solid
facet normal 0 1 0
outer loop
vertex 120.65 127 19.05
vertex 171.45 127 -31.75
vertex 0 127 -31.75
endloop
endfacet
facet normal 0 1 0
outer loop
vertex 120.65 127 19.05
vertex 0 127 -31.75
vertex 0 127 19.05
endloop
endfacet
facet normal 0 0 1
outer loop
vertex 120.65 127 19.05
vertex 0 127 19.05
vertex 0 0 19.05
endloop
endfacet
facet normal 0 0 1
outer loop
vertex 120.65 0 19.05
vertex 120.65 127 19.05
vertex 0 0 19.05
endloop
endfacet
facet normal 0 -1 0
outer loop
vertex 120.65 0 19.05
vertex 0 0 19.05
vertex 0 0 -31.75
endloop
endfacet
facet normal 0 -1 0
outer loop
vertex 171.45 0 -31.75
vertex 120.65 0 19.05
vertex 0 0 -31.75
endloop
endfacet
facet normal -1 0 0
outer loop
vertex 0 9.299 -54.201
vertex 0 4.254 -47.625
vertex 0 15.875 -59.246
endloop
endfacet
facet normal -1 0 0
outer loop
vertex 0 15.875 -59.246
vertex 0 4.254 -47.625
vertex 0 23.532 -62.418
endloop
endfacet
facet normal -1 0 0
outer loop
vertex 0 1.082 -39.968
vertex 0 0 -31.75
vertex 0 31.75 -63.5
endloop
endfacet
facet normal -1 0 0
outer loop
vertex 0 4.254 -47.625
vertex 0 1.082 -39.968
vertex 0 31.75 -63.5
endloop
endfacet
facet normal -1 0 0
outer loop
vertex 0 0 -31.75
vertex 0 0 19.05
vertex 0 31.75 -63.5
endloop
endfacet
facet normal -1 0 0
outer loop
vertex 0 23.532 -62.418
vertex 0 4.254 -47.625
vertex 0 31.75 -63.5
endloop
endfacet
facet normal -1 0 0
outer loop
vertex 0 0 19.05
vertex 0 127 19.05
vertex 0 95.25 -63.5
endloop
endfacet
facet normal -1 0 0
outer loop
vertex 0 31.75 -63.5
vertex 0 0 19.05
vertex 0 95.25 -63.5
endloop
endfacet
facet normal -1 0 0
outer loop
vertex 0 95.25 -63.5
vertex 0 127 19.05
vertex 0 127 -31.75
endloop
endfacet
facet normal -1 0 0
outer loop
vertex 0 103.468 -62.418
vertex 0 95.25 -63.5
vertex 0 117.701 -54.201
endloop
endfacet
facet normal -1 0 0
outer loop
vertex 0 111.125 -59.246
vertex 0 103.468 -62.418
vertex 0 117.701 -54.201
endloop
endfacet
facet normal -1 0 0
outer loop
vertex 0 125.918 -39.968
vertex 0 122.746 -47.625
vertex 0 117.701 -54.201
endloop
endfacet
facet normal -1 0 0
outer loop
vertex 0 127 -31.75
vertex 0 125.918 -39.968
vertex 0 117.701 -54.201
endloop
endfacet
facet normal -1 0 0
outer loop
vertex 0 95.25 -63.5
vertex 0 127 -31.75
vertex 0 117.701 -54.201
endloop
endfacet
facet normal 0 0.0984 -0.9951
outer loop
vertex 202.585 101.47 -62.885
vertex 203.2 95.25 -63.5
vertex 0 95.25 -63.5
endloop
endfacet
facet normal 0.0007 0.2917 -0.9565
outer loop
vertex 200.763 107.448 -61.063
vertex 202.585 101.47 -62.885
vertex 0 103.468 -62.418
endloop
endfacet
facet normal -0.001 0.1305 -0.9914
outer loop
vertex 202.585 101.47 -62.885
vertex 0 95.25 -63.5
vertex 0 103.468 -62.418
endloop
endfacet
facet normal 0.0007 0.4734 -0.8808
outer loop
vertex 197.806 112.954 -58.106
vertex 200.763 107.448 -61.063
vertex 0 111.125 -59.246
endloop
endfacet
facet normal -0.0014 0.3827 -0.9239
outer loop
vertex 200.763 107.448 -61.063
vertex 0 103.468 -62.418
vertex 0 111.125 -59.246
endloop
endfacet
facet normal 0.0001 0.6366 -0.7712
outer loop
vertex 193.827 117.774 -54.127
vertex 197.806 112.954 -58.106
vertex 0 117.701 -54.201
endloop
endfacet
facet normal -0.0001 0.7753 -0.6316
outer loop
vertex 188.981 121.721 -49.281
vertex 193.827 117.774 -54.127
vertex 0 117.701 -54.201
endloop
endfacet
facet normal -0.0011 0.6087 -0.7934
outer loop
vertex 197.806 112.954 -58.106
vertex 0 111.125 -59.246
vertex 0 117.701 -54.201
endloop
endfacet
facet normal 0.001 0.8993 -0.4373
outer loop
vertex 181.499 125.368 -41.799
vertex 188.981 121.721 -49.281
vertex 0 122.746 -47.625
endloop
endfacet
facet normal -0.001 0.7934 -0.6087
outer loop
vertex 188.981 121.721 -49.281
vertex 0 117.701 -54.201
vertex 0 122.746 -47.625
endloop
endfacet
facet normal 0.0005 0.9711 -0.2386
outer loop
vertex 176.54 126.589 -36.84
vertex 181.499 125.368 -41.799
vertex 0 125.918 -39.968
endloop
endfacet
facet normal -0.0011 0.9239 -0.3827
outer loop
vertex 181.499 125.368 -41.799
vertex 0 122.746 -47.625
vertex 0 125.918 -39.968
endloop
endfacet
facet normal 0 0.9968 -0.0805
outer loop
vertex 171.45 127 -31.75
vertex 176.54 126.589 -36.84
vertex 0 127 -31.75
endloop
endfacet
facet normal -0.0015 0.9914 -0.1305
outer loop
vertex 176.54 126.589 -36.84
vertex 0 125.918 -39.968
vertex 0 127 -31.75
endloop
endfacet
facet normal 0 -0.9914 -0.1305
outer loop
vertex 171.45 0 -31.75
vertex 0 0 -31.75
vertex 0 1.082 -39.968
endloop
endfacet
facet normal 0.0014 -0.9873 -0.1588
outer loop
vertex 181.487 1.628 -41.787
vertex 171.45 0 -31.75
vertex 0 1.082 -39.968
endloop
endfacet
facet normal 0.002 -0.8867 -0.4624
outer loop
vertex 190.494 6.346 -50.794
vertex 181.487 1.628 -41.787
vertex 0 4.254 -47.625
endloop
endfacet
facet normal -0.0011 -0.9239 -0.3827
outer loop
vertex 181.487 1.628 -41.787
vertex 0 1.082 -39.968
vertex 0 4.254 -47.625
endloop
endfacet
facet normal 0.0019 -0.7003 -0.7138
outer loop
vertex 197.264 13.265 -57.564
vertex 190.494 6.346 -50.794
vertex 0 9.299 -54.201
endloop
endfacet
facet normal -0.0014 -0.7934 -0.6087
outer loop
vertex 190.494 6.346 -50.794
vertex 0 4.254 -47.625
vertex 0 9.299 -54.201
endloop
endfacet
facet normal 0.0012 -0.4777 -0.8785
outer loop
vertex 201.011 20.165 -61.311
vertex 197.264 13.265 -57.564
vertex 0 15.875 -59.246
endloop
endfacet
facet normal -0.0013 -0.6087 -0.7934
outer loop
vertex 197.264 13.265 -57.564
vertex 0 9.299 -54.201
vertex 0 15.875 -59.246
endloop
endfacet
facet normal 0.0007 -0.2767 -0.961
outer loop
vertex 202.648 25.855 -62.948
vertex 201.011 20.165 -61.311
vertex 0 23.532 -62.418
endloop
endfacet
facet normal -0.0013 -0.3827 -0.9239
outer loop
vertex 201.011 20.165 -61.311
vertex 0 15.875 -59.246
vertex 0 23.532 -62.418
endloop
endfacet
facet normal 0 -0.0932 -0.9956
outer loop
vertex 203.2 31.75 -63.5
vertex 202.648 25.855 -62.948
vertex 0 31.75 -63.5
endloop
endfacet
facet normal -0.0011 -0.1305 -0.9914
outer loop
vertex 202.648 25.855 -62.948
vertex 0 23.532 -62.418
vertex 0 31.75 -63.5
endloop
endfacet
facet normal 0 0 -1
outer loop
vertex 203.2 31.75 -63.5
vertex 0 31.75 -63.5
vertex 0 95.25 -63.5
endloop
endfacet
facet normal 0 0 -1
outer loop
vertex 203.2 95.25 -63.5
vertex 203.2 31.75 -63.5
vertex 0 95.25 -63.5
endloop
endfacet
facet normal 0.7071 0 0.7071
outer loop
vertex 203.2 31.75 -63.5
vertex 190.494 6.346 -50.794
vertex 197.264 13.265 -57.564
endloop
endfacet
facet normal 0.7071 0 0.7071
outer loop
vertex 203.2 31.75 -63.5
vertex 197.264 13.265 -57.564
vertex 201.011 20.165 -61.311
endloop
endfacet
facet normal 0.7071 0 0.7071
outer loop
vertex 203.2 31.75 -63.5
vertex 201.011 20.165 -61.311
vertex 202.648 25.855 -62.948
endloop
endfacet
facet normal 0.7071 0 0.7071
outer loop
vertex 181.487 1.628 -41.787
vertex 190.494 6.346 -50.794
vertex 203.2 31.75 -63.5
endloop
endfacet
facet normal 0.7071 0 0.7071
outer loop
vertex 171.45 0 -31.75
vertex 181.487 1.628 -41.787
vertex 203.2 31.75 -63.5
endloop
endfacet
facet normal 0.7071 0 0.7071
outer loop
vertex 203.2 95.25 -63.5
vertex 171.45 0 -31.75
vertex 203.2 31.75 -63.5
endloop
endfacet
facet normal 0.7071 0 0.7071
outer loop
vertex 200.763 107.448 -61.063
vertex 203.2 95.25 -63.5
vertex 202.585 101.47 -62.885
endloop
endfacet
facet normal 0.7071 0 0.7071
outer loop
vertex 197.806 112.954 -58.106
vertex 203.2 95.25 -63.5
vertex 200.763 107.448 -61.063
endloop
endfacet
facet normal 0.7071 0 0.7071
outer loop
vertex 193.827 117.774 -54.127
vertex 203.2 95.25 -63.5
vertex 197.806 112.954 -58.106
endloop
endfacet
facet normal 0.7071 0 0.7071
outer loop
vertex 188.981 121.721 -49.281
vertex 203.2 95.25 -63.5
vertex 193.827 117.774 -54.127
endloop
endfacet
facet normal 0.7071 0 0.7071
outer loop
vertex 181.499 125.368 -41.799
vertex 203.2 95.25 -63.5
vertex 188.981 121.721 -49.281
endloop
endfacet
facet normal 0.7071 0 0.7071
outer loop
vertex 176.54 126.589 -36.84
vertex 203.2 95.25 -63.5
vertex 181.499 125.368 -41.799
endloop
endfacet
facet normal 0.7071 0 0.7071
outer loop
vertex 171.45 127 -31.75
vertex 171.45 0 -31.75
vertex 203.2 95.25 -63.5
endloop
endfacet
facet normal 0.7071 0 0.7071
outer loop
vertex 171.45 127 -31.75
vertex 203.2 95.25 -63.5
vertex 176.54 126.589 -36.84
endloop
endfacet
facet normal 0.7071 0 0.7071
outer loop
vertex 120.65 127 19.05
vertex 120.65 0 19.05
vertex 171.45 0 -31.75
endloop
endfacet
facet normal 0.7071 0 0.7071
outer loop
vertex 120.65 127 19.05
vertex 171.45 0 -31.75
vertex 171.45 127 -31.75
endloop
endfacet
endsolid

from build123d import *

# Parameters (mm, degrees)
BOSS_EXTRUDE1_DEPTH = 203.2
SKETCH2_W           = 344.402501539
SKETCH2_H           = 780.457540957
CUT_EXTRUDE1_DEPTH  = 59.371664787


with BuildPart() as part:
    # Sketch1 → Boss-Extrude1 (new body)
    with BuildSketch(Plane(origin=(0, 0, 0), x_dir=(0, 0, -1), z_dir=(1, 0, 0))):
        with BuildLine():
            Line((0, 0), (31.75, 0))
            ThreePointArc((31.75, 0), (54.200640303, 9.299359697), (63.5, 31.75))
            Line((63.5, 31.75), (63.5, 95.25))
            ThreePointArc((63.5, 95.25), (54.200640303, 117.700640303), (31.75, 127))
            Line((31.75, 127), (0, 127))
            Line((0, 127), (-19.05, 127))
            Line((-19.05, 127), (-19.05, 0))
            Line((-19.05, 0), (0, 0))
        make_face()
    extrude(amount=BOSS_EXTRUDE1_DEPTH)

    # Sketch2 → Cut-Extrude1 (cut, through all)
    with BuildSketch(Plane(origin=(69.85, 0, 69.85), x_dir=(0, 1, 0), z_dir=(0.707106781, 0, 0.707106781))):
        with Locations((32.995160032, -188.585378543)):
            Rectangle(SKETCH2_W, SKETCH2_H)
    extrude(amount=CUT_EXTRUDE1_DEPTH, mode=Mode.SUBTRACT)


solid = part.part
